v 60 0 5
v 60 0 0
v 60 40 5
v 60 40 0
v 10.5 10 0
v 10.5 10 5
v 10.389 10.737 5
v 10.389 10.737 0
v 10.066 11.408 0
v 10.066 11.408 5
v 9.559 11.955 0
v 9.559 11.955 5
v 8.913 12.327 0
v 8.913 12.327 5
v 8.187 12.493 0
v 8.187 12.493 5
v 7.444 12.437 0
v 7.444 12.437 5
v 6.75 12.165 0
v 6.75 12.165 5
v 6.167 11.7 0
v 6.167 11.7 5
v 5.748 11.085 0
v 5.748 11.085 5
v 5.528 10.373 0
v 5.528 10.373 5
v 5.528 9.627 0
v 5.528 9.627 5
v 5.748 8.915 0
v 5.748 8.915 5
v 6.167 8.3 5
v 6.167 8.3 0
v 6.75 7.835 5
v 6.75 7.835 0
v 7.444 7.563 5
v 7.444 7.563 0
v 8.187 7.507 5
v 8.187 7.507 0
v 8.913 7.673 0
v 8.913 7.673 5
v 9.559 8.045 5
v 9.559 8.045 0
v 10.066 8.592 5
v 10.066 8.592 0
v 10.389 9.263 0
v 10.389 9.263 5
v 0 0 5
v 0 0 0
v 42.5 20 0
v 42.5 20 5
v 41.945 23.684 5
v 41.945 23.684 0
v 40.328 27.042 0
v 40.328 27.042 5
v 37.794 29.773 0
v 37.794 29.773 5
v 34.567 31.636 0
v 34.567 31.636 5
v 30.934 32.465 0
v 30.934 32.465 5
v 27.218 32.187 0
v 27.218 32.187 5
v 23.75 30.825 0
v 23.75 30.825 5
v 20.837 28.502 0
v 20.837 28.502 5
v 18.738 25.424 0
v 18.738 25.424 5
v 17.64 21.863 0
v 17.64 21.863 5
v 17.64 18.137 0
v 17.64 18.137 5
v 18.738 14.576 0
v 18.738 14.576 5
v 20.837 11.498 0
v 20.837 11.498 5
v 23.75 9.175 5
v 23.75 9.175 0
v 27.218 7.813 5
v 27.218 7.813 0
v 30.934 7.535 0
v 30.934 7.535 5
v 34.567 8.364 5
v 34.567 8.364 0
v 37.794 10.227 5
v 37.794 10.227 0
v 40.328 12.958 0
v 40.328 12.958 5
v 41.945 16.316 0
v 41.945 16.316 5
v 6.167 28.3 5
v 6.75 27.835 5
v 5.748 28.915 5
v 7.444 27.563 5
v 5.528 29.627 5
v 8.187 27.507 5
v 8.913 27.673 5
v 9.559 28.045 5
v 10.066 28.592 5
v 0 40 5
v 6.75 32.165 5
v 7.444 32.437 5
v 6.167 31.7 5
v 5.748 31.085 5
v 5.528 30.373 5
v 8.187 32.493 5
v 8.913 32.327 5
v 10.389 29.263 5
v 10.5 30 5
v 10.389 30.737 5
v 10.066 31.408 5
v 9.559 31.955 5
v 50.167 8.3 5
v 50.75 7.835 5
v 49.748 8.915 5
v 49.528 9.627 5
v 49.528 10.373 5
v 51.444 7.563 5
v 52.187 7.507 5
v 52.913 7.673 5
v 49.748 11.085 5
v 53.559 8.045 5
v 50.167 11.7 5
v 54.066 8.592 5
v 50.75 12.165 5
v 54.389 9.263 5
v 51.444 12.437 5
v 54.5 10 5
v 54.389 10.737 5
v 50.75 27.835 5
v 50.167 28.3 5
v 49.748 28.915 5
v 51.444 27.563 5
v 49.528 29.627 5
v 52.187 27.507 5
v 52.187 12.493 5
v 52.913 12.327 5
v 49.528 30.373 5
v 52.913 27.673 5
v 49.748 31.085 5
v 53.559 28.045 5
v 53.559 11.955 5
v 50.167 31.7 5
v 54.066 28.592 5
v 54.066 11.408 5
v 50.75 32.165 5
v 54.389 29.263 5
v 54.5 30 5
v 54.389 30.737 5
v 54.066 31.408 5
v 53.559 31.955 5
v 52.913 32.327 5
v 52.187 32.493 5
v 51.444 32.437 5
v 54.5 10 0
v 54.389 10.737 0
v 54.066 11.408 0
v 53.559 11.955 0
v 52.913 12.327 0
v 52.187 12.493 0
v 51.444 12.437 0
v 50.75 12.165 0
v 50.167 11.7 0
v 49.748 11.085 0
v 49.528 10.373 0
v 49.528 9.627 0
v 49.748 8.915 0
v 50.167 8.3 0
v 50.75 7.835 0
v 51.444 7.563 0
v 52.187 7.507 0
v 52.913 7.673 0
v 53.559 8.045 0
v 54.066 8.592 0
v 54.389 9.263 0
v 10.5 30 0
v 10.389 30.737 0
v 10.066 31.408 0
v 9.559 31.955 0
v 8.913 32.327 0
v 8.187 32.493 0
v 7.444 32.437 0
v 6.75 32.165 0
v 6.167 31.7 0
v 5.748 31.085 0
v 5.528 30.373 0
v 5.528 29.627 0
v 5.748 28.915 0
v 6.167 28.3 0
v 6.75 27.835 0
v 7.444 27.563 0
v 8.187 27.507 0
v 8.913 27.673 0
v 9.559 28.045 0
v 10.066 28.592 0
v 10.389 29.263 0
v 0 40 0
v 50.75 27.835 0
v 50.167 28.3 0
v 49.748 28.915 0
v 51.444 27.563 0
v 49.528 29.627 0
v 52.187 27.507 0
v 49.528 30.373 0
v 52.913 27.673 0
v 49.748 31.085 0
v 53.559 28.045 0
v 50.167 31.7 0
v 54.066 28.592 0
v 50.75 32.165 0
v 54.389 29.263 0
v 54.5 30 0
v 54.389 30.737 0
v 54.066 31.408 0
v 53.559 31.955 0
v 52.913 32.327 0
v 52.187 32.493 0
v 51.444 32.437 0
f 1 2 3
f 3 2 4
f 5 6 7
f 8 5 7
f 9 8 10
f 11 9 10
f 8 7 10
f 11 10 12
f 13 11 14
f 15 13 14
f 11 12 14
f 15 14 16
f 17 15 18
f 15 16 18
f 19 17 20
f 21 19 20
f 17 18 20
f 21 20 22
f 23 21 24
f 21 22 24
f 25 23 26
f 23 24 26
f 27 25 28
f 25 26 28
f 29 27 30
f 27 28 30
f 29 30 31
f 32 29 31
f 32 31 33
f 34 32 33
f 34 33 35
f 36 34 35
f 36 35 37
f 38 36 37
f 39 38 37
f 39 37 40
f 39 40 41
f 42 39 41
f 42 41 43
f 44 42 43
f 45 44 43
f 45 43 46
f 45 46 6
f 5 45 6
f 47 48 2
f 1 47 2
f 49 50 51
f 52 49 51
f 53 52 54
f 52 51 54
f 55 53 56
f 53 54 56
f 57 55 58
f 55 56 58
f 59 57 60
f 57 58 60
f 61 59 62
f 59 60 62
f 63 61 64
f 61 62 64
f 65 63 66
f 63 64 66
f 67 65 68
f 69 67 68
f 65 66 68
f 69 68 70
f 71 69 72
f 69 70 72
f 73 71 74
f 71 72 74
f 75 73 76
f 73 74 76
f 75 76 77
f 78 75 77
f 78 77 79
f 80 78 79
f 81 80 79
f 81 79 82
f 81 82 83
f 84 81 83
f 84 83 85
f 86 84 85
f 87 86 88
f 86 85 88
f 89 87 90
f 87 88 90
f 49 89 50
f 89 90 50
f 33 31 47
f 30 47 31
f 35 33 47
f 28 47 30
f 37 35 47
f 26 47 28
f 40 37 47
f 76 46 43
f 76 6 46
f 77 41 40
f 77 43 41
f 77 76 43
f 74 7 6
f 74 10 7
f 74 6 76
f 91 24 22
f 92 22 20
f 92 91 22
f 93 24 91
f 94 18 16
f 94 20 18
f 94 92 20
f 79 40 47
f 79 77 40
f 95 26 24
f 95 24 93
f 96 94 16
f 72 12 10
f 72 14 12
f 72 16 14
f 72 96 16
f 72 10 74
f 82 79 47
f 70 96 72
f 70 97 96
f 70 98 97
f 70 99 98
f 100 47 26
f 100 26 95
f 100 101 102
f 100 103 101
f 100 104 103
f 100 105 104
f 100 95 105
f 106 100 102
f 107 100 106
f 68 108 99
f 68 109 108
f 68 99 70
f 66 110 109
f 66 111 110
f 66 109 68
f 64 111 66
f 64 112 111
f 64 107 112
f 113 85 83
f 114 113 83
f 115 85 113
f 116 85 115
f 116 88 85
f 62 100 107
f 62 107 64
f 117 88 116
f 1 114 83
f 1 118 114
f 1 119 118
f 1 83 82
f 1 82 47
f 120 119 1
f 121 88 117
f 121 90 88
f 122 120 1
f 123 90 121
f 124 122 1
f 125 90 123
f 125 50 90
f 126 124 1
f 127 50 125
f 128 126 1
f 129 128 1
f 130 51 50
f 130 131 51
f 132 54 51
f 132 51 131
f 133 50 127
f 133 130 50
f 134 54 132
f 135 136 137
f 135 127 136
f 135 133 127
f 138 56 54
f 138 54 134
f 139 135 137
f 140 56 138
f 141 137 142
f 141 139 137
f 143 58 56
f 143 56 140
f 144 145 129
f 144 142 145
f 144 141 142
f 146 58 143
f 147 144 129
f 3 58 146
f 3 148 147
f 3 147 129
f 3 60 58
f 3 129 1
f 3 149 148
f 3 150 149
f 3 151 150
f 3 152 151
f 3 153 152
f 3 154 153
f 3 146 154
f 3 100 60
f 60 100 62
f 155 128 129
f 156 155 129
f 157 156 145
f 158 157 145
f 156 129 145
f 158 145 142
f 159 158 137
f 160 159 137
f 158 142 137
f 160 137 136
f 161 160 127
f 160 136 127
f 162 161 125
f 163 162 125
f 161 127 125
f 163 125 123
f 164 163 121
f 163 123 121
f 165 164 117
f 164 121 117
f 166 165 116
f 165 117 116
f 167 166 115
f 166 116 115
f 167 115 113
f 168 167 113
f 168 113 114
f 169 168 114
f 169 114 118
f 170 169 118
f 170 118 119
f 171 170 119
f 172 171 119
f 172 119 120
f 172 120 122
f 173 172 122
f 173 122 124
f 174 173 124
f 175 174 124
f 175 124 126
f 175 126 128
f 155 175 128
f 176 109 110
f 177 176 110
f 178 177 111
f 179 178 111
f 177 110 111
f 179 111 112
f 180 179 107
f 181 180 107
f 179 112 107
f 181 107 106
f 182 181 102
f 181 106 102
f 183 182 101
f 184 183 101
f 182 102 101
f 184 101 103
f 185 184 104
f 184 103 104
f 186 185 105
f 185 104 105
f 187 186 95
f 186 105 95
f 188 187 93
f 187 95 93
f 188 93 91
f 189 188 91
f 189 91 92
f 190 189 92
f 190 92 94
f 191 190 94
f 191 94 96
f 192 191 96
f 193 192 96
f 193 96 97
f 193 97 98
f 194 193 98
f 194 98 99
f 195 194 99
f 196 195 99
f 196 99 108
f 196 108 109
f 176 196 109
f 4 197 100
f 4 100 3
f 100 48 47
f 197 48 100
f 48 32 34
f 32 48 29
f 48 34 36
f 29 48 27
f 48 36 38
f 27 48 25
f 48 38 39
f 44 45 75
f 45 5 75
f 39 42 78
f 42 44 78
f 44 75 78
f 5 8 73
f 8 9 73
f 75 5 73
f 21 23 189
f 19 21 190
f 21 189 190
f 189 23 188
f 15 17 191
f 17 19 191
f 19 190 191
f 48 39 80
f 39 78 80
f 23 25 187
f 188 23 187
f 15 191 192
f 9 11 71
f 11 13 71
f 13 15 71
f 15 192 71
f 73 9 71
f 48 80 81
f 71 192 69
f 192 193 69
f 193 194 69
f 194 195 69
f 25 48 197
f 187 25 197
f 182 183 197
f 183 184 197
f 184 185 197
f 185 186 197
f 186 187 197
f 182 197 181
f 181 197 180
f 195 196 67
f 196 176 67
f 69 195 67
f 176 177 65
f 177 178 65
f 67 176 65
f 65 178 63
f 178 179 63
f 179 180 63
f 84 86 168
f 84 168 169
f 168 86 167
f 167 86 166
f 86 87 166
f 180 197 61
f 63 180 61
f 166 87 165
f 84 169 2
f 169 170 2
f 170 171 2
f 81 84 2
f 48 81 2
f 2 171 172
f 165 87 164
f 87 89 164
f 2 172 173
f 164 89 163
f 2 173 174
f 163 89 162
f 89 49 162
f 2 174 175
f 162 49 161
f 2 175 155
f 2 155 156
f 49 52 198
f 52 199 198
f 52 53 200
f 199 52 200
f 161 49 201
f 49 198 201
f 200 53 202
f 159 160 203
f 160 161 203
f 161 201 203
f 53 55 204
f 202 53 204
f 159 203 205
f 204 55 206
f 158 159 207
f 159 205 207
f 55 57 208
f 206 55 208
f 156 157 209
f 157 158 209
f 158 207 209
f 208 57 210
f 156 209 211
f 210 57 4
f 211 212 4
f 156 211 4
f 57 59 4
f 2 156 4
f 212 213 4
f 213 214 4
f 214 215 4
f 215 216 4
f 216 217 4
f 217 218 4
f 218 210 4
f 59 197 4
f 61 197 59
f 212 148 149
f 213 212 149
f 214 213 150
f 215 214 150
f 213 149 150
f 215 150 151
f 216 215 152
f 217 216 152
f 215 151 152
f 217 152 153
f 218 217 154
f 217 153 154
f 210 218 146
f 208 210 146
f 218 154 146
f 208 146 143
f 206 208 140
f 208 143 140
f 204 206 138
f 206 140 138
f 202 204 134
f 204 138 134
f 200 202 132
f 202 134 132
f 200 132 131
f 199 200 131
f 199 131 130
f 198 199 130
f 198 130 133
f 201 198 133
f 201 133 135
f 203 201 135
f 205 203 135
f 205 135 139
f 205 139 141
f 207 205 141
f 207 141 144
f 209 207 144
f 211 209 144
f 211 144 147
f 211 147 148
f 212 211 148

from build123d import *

# Parameters (mm, degrees)
SKETCH1_W           = 60
SKETCH1_H           = 40
BOSS_EXTRUDE1_DEPTH = 5
SKETCH2_R           = 12.5
CUT_EXTRUDE1_DEPTH  = 5
SKETCH3_R           = 2.5
CUT_EXTRUDE2_DEPTH  = 10


with BuildPart() as part:
    # Sketch1 → Boss-Extrude1 (new body)
    with BuildSketch(Plane.XY):
        with Locations((30, 20)):
            Rectangle(SKETCH1_W, SKETCH1_H)
    extrude(amount=BOSS_EXTRUDE1_DEPTH)

    # Sketch2 → Cut-Extrude1 (cut)
    with BuildSketch(Plane.XY.offset(5)):
        with Locations((30, 20)):
            Circle(SKETCH2_R)
    extrude(amount=-CUT_EXTRUDE1_DEPTH, mode=Mode.SUBTRACT)

    # Sketch3 → Cut-Extrude2 (cut)
    with BuildSketch(Plane.XY.offset(5)):
        with Locations((8, 30)):
            Circle(SKETCH3_R)
        with Locations((8, 10)):
            Circle(SKETCH3_R)
        with Locations((52, 10)):
            Circle(SKETCH3_R)
        with Locations((52, 30)):
            Circle(SKETCH3_R)
    extrude(amount=-CUT_EXTRUDE2_DEPTH, mode=Mode.SUBTRACT)


solid = part.part
